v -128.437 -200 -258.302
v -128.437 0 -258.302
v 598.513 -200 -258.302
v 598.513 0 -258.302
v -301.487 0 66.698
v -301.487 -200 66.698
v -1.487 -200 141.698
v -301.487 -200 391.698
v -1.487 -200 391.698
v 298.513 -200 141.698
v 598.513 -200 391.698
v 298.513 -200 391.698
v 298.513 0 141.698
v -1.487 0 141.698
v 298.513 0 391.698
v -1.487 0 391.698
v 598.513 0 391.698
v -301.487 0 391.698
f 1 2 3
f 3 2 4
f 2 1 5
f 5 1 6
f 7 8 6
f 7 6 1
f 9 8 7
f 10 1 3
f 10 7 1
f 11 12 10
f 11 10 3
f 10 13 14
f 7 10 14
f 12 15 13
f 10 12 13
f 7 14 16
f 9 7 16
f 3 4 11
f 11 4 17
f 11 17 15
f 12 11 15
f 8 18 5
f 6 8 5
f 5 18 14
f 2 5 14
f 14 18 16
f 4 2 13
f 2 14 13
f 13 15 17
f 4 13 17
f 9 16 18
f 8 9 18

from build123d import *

# Parameters (mm, degrees)
F1_DEPTH = 200
F4_DEPTH = 25
F5_DEPTH = 400


with BuildPart() as f1:
    # F0 (on Front) → F1 (new body)
    with BuildSketch(Plane.XZ):
        Polygon((-1.4871466187, 391.6978864931), (-301.4871466187, 391.6978864931), (-301.4871466187, -258.3021135069), (-190.924435854, -258.3021135069), (-80.4046094418, -258.3021135069), (598.5128533813, -258.3021135069), (598.5128533813, -237.8309071064), (598.5128533813, 391.6978864931), (298.5128533813, 391.6978864931), (298.5128533813, 141.6978864931), (-1.4871466187, 141.6978864931), align=None)
    extrude(amount=F1_DEPTH)

    # F2 (on face) → F4 (cut)
    with BuildSketch(Plane.XZ.offset(200)):
        Polygon((-301.4871466187, 66.6978864931), (-301.4871466187, -258.3021135069), (-128.4365952015, -258.3021135069), align=None)
    extrude(amount=-F4_DEPTH, mode=Mode.SUBTRACT)

    # F5 (cut): a face of the model
    f5_faces = [f1.faces().sort_by_distance(p)[0] for p in [
        (-243.8036294796, -175, -149.9687801736),
    ]]
    extrude(f5_faces, amount=-F5_DEPTH, mode=Mode.SUBTRACT)


solid = f1.part
